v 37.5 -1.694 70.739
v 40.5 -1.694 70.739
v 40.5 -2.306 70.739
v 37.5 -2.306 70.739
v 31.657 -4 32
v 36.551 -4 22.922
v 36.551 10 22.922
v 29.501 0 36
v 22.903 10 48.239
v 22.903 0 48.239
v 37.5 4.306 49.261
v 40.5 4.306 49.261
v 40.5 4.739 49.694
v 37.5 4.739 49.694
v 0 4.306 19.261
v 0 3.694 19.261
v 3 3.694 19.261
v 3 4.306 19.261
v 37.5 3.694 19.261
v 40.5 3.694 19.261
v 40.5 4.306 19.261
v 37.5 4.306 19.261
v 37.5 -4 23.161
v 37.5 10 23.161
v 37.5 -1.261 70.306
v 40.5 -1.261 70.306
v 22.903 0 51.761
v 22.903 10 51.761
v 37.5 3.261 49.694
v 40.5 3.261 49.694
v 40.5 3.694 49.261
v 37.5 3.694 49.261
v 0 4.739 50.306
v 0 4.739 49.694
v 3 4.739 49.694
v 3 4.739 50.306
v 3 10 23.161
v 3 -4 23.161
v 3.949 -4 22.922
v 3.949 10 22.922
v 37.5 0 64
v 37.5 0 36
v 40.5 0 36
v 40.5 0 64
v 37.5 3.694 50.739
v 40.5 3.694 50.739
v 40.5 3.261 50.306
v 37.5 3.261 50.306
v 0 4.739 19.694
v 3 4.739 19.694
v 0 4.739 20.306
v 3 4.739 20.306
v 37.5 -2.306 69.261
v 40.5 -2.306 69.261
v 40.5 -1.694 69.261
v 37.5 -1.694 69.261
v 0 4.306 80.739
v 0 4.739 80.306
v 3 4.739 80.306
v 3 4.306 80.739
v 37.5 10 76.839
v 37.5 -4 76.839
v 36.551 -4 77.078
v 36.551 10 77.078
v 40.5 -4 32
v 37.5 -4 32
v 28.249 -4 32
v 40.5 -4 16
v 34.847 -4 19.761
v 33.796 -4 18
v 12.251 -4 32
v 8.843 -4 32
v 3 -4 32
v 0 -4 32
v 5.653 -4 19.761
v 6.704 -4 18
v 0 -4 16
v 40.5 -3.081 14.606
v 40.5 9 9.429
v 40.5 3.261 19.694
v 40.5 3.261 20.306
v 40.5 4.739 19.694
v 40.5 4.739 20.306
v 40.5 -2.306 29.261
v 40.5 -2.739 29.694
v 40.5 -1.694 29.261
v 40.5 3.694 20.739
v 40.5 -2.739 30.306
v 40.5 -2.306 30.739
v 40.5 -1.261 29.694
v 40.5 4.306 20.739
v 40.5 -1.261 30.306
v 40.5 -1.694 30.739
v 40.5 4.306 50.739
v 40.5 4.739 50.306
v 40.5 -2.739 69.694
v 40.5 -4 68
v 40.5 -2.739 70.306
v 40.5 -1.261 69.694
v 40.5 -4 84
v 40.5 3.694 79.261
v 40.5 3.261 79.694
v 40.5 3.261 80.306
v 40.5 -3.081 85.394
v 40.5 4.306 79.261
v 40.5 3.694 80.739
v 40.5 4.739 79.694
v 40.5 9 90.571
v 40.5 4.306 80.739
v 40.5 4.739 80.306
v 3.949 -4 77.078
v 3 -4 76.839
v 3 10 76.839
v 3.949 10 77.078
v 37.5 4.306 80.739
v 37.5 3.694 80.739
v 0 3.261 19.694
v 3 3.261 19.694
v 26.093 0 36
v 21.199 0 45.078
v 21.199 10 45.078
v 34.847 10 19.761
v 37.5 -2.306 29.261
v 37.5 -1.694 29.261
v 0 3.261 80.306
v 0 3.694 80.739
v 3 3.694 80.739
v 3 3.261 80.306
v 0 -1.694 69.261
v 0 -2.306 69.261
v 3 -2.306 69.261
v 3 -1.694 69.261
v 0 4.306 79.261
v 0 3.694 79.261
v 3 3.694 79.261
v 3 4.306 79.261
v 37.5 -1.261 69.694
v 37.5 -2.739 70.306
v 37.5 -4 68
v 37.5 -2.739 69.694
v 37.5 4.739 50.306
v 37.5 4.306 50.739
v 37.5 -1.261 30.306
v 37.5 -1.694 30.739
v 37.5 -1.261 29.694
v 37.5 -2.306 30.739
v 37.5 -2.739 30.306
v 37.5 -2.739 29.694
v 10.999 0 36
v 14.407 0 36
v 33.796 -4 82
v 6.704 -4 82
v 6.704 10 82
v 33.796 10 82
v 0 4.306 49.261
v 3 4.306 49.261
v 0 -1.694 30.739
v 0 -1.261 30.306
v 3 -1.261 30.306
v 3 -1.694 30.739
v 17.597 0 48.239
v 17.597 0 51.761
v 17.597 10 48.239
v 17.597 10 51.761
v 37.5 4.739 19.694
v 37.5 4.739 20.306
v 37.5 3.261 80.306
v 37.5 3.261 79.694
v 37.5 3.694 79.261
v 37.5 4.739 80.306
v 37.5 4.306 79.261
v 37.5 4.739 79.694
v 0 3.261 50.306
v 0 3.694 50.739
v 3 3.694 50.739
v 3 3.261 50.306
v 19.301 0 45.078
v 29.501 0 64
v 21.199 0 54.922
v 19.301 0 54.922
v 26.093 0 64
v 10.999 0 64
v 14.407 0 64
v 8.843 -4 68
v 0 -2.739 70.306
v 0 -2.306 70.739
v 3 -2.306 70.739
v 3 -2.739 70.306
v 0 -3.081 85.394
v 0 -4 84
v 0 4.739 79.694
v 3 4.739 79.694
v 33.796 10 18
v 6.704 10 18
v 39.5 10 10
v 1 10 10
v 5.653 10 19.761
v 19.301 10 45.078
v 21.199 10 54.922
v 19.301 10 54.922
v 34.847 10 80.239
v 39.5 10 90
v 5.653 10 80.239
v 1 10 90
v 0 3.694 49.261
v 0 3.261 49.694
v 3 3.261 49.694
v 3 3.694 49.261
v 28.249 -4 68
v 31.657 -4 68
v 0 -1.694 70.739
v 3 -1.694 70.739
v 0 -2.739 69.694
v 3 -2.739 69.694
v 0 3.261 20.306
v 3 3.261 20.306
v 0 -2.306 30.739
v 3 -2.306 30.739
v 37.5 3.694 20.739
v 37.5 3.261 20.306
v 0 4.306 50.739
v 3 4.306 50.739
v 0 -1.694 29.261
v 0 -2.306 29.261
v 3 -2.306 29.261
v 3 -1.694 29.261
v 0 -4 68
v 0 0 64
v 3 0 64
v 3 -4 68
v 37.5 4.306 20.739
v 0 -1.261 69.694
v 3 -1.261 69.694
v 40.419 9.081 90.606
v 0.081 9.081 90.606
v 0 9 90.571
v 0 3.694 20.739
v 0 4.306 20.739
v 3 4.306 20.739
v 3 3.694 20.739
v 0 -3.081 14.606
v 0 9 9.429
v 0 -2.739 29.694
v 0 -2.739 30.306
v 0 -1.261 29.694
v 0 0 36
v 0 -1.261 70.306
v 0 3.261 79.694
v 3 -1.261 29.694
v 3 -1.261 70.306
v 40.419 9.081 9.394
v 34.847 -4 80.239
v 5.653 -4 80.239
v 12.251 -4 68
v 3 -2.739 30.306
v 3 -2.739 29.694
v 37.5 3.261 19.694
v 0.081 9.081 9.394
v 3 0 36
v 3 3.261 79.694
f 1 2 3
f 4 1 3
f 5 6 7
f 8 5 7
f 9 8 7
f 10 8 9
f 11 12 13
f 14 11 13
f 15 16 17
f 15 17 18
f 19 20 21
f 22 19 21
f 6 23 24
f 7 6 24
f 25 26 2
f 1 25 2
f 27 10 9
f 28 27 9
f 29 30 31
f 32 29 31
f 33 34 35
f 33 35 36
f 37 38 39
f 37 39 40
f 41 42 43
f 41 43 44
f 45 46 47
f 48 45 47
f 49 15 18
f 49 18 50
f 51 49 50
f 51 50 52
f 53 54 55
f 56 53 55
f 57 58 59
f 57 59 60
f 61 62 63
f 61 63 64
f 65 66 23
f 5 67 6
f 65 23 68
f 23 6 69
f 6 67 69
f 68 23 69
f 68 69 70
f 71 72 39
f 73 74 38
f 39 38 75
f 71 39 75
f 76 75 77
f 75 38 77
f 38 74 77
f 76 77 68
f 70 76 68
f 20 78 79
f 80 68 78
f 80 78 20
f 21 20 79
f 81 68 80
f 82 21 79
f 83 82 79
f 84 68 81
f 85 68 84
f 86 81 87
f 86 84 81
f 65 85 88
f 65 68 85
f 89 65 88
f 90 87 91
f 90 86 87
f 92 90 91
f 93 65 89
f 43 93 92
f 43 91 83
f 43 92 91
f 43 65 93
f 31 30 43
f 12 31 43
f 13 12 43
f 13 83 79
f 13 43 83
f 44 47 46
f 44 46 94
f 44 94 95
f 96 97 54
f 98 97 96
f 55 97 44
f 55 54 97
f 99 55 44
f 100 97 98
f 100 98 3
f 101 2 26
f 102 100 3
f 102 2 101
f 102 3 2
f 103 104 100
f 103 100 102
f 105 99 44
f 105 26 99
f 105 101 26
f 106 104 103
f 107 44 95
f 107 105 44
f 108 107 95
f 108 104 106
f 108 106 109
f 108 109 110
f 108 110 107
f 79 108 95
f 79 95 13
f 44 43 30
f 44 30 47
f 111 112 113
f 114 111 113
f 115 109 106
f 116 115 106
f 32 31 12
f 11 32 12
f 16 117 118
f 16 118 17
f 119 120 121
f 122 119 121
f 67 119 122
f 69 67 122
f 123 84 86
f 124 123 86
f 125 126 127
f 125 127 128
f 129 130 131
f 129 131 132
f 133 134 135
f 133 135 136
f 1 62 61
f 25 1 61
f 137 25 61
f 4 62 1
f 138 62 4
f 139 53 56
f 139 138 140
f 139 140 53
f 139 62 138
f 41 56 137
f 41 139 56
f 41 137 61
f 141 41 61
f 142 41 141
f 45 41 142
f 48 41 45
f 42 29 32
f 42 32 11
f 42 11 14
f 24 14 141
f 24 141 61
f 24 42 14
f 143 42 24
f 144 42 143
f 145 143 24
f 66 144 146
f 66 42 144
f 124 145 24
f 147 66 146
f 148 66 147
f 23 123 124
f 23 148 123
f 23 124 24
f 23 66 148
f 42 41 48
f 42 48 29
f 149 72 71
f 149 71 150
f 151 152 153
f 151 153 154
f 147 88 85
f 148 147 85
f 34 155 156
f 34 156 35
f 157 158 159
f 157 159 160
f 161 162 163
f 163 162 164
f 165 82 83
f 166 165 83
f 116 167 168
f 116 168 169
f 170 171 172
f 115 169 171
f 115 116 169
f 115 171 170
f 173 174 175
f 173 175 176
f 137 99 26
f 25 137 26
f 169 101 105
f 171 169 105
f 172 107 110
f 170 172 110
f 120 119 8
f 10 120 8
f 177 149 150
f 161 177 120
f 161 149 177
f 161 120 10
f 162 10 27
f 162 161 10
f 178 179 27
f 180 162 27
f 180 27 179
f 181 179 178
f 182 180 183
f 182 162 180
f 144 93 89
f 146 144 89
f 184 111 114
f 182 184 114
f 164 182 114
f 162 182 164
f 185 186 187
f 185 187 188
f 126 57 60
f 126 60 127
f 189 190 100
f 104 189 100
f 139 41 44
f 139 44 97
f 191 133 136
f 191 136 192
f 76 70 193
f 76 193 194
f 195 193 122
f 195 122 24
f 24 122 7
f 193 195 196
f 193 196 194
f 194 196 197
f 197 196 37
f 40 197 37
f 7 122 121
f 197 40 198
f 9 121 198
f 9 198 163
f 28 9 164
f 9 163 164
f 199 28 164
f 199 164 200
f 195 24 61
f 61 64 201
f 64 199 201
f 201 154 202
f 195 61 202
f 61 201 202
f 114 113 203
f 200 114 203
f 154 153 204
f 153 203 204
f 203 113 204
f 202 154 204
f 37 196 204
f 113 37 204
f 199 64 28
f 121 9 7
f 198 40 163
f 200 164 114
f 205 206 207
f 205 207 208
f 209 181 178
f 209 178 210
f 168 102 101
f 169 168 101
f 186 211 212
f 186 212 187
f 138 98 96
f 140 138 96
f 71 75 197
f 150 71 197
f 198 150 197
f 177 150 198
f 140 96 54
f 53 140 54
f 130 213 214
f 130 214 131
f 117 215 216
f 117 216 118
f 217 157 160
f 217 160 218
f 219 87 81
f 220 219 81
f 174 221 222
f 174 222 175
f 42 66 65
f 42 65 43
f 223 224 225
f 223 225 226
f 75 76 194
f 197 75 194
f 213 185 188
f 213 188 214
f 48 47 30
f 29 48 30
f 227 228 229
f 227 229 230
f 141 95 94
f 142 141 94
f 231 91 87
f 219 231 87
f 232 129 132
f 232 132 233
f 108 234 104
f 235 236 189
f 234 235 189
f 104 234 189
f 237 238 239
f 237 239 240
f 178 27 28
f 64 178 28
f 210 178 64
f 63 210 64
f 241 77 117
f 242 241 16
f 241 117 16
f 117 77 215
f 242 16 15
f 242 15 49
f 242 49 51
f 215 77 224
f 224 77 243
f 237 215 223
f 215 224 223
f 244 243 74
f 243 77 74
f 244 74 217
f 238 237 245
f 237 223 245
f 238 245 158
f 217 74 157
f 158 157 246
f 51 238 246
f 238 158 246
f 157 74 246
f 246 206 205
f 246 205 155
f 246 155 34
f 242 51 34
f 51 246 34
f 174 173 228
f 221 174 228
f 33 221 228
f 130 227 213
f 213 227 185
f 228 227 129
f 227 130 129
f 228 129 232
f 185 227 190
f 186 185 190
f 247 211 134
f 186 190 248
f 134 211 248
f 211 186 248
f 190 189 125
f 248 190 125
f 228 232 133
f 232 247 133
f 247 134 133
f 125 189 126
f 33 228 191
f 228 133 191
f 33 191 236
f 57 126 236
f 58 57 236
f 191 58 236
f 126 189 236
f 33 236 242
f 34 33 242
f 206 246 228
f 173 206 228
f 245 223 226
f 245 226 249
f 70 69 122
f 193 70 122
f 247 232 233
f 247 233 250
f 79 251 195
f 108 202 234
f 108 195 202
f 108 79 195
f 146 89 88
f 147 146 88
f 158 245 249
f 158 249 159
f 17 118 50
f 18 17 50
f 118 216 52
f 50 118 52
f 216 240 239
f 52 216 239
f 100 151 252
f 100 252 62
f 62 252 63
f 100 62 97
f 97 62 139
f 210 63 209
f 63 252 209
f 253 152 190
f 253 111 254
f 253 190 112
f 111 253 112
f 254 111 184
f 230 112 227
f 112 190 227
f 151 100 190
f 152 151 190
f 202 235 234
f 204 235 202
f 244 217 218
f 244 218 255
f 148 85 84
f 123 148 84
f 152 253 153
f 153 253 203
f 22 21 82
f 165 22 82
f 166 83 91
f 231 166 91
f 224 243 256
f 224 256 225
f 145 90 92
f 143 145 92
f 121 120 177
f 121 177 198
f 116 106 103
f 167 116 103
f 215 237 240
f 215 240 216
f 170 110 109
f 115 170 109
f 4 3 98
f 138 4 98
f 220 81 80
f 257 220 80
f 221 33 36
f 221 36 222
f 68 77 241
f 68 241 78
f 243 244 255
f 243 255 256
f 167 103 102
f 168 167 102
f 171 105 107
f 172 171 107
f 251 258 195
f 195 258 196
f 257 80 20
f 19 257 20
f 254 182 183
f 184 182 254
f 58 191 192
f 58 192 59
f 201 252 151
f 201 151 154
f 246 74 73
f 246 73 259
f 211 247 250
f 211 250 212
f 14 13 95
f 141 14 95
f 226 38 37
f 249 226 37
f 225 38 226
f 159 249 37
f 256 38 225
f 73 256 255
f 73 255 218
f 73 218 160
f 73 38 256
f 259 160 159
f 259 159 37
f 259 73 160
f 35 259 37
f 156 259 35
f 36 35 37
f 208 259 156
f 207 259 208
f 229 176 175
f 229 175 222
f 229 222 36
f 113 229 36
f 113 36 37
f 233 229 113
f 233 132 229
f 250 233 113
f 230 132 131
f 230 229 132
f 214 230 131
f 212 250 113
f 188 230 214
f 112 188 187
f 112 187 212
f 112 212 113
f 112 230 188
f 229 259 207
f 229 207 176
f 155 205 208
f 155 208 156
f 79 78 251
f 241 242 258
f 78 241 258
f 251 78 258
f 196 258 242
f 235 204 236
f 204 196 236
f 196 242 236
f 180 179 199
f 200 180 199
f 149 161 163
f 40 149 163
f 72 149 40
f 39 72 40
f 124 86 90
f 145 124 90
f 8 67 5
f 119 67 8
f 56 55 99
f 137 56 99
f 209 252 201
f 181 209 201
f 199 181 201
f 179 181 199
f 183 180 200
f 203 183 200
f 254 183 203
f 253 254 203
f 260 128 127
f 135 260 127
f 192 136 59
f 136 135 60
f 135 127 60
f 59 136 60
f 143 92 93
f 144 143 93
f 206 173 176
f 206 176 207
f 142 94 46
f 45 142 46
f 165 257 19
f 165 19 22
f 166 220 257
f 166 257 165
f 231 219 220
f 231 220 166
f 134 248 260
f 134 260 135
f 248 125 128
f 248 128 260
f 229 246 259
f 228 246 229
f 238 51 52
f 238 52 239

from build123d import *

# Parameters (mm, degrees)
PAD_DEPTH       = 40.5
POCKET_DEPTH    = 14.001
CHAMFER_SIZE    = 2
POCKET001_DEPTH = 3
POCKET002_DEPTH = 3
POCKET003_DEPTH = 40.501
CHAMFER001_SIZE = 1


with BuildPart() as part:
    # Sketch → Pad (new body)
    with BuildSketch(Plane.YZ):
        Polygon((10, 9), (10, 91), (-4, 85), (-4, 15), align=None)
    extrude(amount=PAD_DEPTH)

    # Sketch001 (on Face1 of Pad) → Pocket (cut, through all)
    with BuildSketch(Plane(origin=(0, -4, 0), x_dir=(0, 0, -1), z_dir=(0, -1, 0))):
        Polygon((-78.838843, 37.5), (-21.161157, 37.5), (-50, 21.954061), align=None)
        Polygon((-82, 35.795939), (-53.161157, 20.25), (-82, 4.704061), align=None)
        Polygon((-21.161157, 3), (-78.838843, 3), (-50, 18.545939), align=None)
        Polygon((-46.838843, 20.25), (-18, 35.795939), (-18, 4.704061), align=None)
    extrude(amount=-POCKET_DEPTH, mode=Mode.SUBTRACT)

    # Chamfer
    chamfer_edges = [part.edges().sort_by_distance(p)[0] for p in [
        (3, 3, 78.838843),
        (18.545939, 3, 50),
        (35.795939, 3, 18),
        (20.25, 3, 46.838843),
        (37.5, 3, 78.838843),
        (4.704061, 3, 18),
        (37.5, 3, 21.161157),
        (21.954061, 3, 50),
        (4.704061, 3, 82),
        (20.25, 3, 53.161157),
        (35.795939, 3, 82),
        (3, 3, 21.161157),
    ]]
    chamfer(chamfer_edges, length=CHAMFER_SIZE)

    # Sketch002 (on Face10 of Chamfer) → Pocket001 (cut)
    with BuildSketch(Plane.YZ.offset(40.5)):
        Polygon((3.693853, 80.739104), (3.260896, 80.306147), (3.260896, 79.693853), (3.693853, 79.260896), (4.306147, 79.260896), (4.739104, 79.693853), (4.739104, 80.306147), (4.306147, 80.739104), align=None)
        Polygon((3.693853, 50.739104), (3.260896, 50.306147), (3.260896, 49.693853), (3.693853, 49.260896), (4.306147, 49.260896), (4.739104, 49.693853), (4.739104, 50.306147), (4.306147, 50.739104), align=None)
        Polygon((3.693853, 20.739104), (3.260896, 20.306147), (3.260896, 19.693853), (3.693853, 19.260896), (4.306147, 19.260896), (4.739104, 19.693853), (4.739104, 20.306147), (4.306147, 20.739104), align=None)
        Polygon((-1.693853, 69.260896), (-1.260896, 69.693853), (-1.260896, 70.306147), (-1.693853, 70.739104), (-2.306147, 70.739104), (-2.739104, 70.306147), (-2.739104, 69.693853), (-2.306147, 69.260896), align=None)
        Polygon((-1.693853, 29.260896), (-1.260896, 29.693853), (-1.260896, 30.306147), (-1.693853, 30.739104), (-2.306147, 30.739104), (-2.739104, 30.306147), (-2.739104, 29.693853), (-2.306147, 29.260896), align=None)
    extrude(amount=-POCKET001_DEPTH, mode=Mode.SUBTRACT)

    # Sketch003 (on Face9 of Pocket001) → Pocket002 (cut)
    with BuildSketch(Plane.YZ):
        Polygon((3.693853, 80.739104), (3.260896, 80.306147), (3.260896, 79.693853), (3.693853, 79.260896), (4.306147, 79.260896), (4.739104, 79.693853), (4.739104, 80.306147), (4.306147, 80.739104), align=None)
        Polygon((3.693853, 50.739104), (3.260896, 50.306147), (3.260896, 49.693853), (3.693853, 49.260896), (4.306147, 49.260896), (4.739104, 49.693853), (4.739104, 50.306147), (4.306147, 50.739104), align=None)
        Polygon((3.693853, 20.739104), (3.260896, 20.306147), (3.260896, 19.693853), (3.693853, 19.260896), (4.306147, 19.260896), (4.739104, 19.693853), (4.739104, 20.306147), (4.306147, 20.739104), align=None)
        Polygon((-1.693853, 69.260896), (-1.260896, 69.693853), (-1.260896, 70.306147), (-1.693853, 70.739104), (-2.306147, 70.739104), (-2.739104, 70.306147), (-2.739104, 69.693853), (-2.306147, 69.260896), align=None)
        Polygon((-1.693853, 29.260896), (-1.260896, 29.693853), (-1.260896, 30.306147), (-1.693853, 30.739104), (-2.306147, 30.739104), (-2.739104, 30.306147), (-2.739104, 29.693853), (-2.306147, 29.260896), align=None)
    extrude(amount=POCKET002_DEPTH, mode=Mode.SUBTRACT)

    # Sketch004 → Pocket003 (cut, through all)
    with BuildSketch(Plane(origin=(0, 0, 0), x_dir=(0, 1, 0), z_dir=(-1, 0, 0))):
        Polygon((-4, -32), (0, -36), (0, -64), (-4, -68), align=None)
    extrude(amount=-POCKET003_DEPTH, mode=Mode.SUBTRACT)

    # Chamfer001
    chamfer001_edges = [part.edges().sort_by_distance(p)[0] for p in [
        (20.25, 10, 91),
        (20.25, 10, 9),
        (0, 10, 50),
        (40.5, 10, 50),
        (20.25, -4, 85),
        (20.25, -4, 15),
    ]]
    chamfer(chamfer001_edges, length=CHAMFER001_SIZE)


solid = part.part
